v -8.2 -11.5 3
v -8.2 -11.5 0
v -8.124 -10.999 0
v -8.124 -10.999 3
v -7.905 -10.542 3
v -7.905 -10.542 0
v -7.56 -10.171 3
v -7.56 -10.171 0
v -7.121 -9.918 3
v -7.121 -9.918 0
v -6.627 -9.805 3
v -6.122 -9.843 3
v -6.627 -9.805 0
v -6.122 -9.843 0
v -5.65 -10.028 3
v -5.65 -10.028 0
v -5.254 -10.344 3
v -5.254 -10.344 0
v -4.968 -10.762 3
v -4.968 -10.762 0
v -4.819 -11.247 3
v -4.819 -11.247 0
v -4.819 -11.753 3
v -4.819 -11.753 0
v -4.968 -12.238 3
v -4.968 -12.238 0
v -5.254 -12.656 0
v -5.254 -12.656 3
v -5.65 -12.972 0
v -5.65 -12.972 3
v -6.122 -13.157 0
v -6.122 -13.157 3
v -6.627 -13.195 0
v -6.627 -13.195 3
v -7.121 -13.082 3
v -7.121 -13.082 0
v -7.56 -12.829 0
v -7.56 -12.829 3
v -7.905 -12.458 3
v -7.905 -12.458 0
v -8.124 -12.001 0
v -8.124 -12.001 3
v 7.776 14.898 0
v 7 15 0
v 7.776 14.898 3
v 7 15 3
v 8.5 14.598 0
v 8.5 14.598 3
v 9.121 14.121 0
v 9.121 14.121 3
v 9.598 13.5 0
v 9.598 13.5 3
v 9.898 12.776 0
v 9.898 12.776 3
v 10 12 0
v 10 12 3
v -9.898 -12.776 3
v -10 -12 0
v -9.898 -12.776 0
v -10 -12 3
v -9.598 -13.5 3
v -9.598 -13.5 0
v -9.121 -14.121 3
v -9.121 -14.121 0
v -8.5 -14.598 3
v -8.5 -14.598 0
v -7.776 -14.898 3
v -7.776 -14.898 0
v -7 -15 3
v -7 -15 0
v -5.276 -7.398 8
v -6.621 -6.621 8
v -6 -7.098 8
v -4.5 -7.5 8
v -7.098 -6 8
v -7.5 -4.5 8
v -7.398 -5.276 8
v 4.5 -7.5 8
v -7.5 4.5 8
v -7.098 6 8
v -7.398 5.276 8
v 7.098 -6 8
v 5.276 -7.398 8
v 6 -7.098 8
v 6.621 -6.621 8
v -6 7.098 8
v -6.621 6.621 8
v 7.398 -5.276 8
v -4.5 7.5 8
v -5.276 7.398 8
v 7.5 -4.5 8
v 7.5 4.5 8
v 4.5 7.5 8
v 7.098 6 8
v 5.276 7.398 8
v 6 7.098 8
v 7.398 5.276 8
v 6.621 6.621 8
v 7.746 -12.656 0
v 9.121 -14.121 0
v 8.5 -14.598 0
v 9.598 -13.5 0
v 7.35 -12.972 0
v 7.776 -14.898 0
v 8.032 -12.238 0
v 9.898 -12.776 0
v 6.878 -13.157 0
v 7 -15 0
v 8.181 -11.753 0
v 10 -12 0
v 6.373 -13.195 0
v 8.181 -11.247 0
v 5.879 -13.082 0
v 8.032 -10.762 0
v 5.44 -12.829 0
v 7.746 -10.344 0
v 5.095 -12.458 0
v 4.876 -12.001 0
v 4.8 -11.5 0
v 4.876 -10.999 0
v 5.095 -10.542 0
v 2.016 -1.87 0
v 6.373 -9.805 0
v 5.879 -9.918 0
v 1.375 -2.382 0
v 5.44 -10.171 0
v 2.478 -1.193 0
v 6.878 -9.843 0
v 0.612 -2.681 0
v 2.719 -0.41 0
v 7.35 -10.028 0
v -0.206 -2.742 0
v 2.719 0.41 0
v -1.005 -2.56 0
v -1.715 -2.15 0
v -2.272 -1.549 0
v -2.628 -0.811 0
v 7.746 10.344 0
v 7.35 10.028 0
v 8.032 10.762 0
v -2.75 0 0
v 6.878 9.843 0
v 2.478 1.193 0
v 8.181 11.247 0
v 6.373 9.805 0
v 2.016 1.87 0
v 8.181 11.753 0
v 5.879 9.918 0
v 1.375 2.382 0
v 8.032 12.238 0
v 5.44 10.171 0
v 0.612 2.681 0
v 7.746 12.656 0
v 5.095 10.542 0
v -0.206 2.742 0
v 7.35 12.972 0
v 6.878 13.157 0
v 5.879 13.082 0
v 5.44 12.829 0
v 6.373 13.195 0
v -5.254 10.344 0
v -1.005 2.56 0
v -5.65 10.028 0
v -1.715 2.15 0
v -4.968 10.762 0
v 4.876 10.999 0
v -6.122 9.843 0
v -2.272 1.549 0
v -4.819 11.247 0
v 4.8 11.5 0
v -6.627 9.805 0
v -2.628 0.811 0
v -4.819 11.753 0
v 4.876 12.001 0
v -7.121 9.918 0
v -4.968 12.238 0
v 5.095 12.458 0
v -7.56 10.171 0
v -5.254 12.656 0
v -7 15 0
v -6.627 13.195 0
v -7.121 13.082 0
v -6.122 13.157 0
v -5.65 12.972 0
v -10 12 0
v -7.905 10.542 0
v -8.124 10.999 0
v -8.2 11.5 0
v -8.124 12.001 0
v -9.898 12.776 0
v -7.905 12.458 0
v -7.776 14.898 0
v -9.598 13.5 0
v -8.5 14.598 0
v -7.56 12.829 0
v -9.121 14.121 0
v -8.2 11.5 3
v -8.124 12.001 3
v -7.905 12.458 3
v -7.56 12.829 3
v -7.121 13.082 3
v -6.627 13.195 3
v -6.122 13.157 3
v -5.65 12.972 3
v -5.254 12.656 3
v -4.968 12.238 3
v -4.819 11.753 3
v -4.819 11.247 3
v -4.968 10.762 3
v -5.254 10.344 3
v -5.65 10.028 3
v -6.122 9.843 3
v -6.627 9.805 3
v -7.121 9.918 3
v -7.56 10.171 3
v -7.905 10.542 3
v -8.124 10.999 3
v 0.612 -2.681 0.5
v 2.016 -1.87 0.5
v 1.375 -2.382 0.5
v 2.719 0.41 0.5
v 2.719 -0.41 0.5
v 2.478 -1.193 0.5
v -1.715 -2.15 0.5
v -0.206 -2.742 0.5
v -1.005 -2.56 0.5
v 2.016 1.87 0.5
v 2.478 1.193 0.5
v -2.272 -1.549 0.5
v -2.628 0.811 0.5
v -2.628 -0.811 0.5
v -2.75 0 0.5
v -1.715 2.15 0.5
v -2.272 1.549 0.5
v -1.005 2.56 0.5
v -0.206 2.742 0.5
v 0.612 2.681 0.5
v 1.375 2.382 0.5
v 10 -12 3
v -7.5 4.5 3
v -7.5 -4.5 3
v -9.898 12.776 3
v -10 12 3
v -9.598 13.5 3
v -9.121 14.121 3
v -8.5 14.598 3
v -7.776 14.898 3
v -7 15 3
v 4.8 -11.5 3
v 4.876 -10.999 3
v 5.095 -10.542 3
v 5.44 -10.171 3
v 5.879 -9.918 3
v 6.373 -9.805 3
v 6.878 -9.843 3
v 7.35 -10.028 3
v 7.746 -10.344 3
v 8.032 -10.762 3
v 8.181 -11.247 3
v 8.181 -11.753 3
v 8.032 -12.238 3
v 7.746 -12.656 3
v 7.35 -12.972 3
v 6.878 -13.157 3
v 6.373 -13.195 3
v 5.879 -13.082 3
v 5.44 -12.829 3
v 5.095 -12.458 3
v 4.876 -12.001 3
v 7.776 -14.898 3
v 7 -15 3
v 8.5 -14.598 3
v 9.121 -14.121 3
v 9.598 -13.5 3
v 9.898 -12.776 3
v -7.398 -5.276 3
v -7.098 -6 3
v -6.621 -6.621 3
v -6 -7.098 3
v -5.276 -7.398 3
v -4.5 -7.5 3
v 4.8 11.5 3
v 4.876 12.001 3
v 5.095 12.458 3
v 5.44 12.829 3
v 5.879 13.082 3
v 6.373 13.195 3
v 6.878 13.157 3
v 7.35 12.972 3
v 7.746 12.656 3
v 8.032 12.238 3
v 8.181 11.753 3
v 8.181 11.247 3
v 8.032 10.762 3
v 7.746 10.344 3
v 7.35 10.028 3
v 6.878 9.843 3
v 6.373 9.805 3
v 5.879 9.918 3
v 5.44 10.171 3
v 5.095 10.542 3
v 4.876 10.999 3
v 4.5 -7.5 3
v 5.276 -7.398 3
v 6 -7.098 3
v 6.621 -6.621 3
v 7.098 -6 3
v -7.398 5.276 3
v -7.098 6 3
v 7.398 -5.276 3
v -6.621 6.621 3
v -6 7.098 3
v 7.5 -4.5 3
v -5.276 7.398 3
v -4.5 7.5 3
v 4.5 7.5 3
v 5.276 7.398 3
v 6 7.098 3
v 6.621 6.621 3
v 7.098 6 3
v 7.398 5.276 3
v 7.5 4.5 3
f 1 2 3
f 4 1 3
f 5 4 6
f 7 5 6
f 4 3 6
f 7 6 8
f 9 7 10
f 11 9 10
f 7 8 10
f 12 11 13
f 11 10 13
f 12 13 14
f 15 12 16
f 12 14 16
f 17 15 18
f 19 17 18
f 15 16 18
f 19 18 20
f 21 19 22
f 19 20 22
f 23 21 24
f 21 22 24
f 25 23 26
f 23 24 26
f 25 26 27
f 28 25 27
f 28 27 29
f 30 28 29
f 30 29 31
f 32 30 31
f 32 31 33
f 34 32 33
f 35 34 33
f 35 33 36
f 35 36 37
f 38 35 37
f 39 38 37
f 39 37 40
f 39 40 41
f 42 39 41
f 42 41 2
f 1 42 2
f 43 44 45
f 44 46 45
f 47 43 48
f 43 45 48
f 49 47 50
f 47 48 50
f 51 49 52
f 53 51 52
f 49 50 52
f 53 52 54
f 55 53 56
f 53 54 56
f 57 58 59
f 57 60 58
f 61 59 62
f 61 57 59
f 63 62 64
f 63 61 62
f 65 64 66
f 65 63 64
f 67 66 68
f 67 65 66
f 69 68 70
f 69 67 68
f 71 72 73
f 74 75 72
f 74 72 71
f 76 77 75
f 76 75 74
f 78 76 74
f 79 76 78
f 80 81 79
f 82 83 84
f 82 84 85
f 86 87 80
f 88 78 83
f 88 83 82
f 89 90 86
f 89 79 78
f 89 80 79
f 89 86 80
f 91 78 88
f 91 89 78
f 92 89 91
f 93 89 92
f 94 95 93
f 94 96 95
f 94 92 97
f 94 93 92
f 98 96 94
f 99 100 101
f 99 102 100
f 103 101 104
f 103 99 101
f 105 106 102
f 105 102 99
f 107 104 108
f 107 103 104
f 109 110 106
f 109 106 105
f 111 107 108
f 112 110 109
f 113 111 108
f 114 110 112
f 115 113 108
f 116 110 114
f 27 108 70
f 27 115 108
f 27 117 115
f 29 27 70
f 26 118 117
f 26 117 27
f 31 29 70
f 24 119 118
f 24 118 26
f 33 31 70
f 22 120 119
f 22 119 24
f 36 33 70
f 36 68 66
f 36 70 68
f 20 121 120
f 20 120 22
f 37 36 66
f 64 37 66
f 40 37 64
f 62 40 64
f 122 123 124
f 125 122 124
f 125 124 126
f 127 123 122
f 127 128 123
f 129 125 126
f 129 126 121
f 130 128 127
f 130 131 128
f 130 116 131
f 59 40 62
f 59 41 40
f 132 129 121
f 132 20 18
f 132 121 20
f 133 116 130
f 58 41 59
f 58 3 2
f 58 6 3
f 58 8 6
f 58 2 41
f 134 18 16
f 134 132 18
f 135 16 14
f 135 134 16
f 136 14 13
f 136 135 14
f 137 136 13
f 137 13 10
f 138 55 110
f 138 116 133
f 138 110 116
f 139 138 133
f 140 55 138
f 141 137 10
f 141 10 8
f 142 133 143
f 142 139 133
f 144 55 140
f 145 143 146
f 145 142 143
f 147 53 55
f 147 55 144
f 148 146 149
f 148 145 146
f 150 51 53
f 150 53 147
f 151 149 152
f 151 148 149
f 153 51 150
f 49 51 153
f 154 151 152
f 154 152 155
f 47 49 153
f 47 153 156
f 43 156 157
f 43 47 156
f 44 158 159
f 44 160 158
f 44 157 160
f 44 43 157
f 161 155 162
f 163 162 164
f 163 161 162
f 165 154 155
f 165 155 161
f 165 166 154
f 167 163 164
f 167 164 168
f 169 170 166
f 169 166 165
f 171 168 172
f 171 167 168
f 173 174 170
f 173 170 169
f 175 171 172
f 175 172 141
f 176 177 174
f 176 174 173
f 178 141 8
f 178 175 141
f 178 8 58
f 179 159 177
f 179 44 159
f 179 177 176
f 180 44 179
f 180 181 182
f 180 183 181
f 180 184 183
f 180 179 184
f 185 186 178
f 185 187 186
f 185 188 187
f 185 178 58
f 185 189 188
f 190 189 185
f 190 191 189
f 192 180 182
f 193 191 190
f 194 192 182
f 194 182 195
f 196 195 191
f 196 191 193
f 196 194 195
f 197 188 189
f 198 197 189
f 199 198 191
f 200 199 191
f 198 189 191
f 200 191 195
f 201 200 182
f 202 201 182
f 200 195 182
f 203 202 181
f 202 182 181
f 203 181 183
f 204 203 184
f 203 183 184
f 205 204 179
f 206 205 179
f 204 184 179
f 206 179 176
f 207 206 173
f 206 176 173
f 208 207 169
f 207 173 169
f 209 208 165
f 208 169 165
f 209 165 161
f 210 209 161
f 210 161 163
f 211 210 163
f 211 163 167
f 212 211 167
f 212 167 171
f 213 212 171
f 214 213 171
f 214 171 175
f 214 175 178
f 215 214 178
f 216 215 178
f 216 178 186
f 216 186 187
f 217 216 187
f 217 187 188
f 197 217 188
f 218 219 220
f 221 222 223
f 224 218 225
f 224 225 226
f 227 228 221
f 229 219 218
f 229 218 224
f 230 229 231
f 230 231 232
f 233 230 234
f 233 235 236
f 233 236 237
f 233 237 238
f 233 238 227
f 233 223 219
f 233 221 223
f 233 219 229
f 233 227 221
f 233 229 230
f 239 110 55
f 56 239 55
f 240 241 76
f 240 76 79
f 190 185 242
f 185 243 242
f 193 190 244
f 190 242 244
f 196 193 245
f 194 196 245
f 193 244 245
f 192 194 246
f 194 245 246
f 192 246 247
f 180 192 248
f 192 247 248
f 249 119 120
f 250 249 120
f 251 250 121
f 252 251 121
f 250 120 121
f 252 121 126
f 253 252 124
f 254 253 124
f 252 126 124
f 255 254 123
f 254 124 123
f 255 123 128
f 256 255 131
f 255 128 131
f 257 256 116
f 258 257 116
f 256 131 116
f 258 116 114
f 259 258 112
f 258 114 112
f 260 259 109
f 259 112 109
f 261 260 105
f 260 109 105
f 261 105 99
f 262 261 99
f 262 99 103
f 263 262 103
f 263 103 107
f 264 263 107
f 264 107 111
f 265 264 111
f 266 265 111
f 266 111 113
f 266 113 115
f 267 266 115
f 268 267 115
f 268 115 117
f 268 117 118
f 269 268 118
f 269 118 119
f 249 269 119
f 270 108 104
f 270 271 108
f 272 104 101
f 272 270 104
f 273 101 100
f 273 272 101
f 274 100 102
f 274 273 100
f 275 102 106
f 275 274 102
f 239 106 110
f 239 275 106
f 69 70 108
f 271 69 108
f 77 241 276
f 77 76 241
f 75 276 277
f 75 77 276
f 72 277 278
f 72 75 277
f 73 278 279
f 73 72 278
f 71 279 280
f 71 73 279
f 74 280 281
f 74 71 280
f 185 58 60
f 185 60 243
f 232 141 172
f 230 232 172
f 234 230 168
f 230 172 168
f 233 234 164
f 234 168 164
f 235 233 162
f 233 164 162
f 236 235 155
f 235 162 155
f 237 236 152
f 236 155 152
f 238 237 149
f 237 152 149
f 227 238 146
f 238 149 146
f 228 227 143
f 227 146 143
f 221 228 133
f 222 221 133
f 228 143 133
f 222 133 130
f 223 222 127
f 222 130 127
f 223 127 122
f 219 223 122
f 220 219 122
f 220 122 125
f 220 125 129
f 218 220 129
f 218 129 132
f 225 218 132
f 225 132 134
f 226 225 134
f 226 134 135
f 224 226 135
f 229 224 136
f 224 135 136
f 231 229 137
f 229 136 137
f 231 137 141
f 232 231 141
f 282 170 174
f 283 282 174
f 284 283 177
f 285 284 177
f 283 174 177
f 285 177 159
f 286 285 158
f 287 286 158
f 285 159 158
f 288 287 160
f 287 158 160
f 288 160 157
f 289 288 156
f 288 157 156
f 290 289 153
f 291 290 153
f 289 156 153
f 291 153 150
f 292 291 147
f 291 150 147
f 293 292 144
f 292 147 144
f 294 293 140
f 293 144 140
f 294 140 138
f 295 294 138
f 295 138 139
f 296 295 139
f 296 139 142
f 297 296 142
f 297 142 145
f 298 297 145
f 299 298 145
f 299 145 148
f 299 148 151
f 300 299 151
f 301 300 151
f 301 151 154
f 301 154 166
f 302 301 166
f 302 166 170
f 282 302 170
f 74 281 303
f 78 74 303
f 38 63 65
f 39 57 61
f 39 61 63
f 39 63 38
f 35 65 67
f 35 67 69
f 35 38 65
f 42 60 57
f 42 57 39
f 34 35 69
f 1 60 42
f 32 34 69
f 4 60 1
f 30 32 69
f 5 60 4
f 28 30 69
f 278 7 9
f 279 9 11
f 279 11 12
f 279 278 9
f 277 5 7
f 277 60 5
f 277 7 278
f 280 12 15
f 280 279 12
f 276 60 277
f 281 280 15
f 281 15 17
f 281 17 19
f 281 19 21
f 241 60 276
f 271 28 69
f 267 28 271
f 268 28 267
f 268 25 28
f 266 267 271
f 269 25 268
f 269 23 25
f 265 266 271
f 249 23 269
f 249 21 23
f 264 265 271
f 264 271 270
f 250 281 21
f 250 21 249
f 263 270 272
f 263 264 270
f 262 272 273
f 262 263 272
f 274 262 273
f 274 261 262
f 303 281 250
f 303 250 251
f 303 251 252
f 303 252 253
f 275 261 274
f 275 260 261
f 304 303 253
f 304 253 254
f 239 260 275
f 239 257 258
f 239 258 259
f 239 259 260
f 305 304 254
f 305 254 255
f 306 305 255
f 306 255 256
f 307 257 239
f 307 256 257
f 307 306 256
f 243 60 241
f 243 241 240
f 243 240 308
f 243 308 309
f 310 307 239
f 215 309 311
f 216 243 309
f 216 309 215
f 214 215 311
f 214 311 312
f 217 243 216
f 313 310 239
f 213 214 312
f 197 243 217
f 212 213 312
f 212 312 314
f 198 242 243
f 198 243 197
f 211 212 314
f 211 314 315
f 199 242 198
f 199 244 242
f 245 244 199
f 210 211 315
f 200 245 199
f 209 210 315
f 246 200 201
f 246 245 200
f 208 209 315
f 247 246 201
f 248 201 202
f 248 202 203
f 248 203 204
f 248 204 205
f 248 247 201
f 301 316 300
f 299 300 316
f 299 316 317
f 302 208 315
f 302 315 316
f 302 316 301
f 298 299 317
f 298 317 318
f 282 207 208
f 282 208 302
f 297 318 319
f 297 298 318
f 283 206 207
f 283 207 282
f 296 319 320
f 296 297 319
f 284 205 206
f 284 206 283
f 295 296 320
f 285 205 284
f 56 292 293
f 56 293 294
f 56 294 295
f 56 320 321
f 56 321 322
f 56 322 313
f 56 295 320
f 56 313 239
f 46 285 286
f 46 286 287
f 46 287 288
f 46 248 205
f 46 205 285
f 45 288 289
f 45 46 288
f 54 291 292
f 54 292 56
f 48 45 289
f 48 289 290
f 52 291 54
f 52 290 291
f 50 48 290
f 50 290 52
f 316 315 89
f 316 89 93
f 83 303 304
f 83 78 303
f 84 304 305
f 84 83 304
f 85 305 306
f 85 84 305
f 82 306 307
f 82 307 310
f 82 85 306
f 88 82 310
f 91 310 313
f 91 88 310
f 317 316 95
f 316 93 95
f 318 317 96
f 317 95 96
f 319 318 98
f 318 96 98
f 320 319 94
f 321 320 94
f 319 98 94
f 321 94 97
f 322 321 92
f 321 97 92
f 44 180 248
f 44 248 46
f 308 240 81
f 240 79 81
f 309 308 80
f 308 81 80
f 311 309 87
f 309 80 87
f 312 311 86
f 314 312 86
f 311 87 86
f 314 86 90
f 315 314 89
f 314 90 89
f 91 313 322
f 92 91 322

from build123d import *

# Parameters (mm, degrees)
SKETCH1_W                  = 20
SKETCH1_H                  = 30
BOSS_EXTRUDE1_DEPTH        = 3
F_3_4_3_4_DIAMETER_HOLE1_D = 3.4
SKETCH5_R                  = 3.4
CUT_EXTRUDE1_DEPTH         = 0.5
FILLET1_R                  = 3
SKETCH7_W                  = 8
SKETCH7_H                  = 15
BOSS_EXTRUDE3_DEPTH        = 11
CUT_EXTRUDE3_DEPTH         = 25.839484697
CUT_EXTRUDE3_DEPTH_BACK    = 25.839484697
SKETCH11_OUTSIDE_W         = 29.736
SKETCH11_OUTSIDE_H         = 39.736
SKETCH11_OUTSIDE_R         = 2.5
CUT_EXTRUDE4_DEPTH         = 22.118712082
SKETCH12_W                 = 7.43023475
SKETCH12_H                 = 21.108621448
CUT_EXTRUDE5_DEPTH         = 29.653097564
SKETCH13_R                 = 3.4
SKETCH13_R_2               = 2.75
BOSS_EXTRUDE4_DEPTH        = 0.5
SKETCH14_W                 = 15
SKETCH14_H                 = 15
BOSS_EXTRUDE5_DEPTH        = 5
FILLET2_R                  = 3


with BuildPart() as part:
    # Sketch1 → Boss-Extrude1 (new body)
    with BuildSketch(Plane.XY):
        Rectangle(SKETCH1_W, SKETCH1_H)
    extrude(amount=BOSS_EXTRUDE1_DEPTH)

    # Ø3.4 (3.4) Diameter Hole1 (through all)
    with Locations(Plane.XY.offset(3)):
        with Locations((-6.5, 11.5), (6.5, 11.5), (6.5, -11.5), (-6.5, -11.5)):
            Hole(F_3_4_3_4_DIAMETER_HOLE1_D / 2)

    # Sketch5 → Cut-Extrude1 (cut)
    with BuildSketch(Plane(origin=(0, 0, 0), x_dir=(-1, 0, 0), z_dir=(0, 0, -1))):
        Circle(SKETCH5_R)
    extrude(amount=-CUT_EXTRUDE1_DEPTH, mode=Mode.SUBTRACT)

    # Fillet1
    fillet1_edges = [part.edges().sort_by_distance(p)[0] for p in [
        (10, -15, 1.5),
        (-10, -15, 1.5),
        (-10, 15, 1.5),
        (10, 15, 1.5),
    ]]
    fillet(fillet1_edges, radius=FILLET1_R)

    # Sketch7 → Boss-Extrude3 (add)
    with BuildSketch(Plane.XY.offset(3)):
        Rectangle(SKETCH7_W, SKETCH7_H)
    extrude(amount=BOSS_EXTRUDE3_DEPTH)

    # Sketch8 → Cut-Extrude3 (cut, two sides: drawn at the far end of the back side and taken through both)
    with BuildSketch(Plane(origin=(4, 0, 0), x_dir=(0, 0, -1), z_dir=(1, 0, 0)).offset(-CUT_EXTRUDE3_DEPTH_BACK)):
        Polygon((-14, -6), (-14, -7), (-13.133974596, -6.5), align=None)
        Polygon((-13.133974596, -7.5), (-14, -7), (-14, -7.5), align=None)
        Polygon((-14, -5), (-14, -6), (-13.133974596, -5.5), align=None)
        Polygon((-14, -4), (-14, -5), (-13.133974596, -4.5), align=None)
        Polygon((-14, -3), (-14, -4), (-13.133974596, -3.5), align=None)
        Polygon((-14, 7), (-13.133974596, 7.5), (-14, 7.5), align=None)
        Polygon((-14, -2), (-14, -3), (-13.133974596, -2.5), align=None)
        Polygon((-13.133974596, 6.5), (-14, 7), (-14, 6), align=None)
        Polygon((-14, -1), (-14, -2), (-13.133974596, -1.5), align=None)
        Polygon((-13.133974596, 5.5), (-14, 6), (-14, 5), align=None)
        Polygon((-14, 0), (-14, -1), (-13.133974596, -0.5), align=None)
        Polygon((-13.133974596, 4.5), (-14, 5), (-14, 4), align=None)
        Polygon((-14, 1), (-14, 0), (-13.133974596, 0.5), align=None)
        Polygon((-13.133974596, 3.5), (-14, 4), (-14, 3), align=None)
        Polygon((-14, 2), (-14, 1), (-13.133974596, 1.5), align=None)
        Polygon((-13.133974596, 2.5), (-14, 3), (-14, 2), align=None)
    extrude(amount=CUT_EXTRUDE3_DEPTH + CUT_EXTRUDE3_DEPTH_BACK, mode=Mode.SUBTRACT)

    # Sketch11 outside → Cut-Extrude4 (cut, through all)
    with BuildSketch(Plane.XY.offset(3)):
        Rectangle(SKETCH11_OUTSIDE_W, SKETCH11_OUTSIDE_H)
        Circle(SKETCH11_OUTSIDE_R, mode=Mode.SUBTRACT)
    extrude(amount=CUT_EXTRUDE4_DEPTH, mode=Mode.SUBTRACT)

    # Sketch12 → Cut-Extrude5 (cut, through all)
    with BuildSketch(Plane(origin=(10, 0, 0), x_dir=(0, 0, -1), z_dir=(1, 0, 0))):
        with Locations((-11.715117375, -0.112579314)):
            Rectangle(SKETCH12_W, SKETCH12_H)
    extrude(amount=-CUT_EXTRUDE5_DEPTH, mode=Mode.SUBTRACT)

    # Sketch13 → Boss-Extrude4 (add)
    with BuildSketch(Plane(origin=(0, 0, 0), x_dir=(-1, 0, 0), z_dir=(0, 0, -1))):
        Circle(SKETCH13_R)
        Circle(SKETCH13_R_2, mode=Mode.SUBTRACT)
    extrude(amount=-BOSS_EXTRUDE4_DEPTH)

    # Sketch14 → Boss-Extrude5 (add)
    with BuildSketch(Plane.XY.offset(3)):
        Rectangle(SKETCH14_W, SKETCH14_H)
    extrude(amount=BOSS_EXTRUDE5_DEPTH)

    # Fillet2
    fillet2_edges = [part.edges().sort_by_distance(p)[0] for p in [
        (7.5, 7.5, 5.5),
        (7.5, -7.5, 5.5),
        (-7.5, -7.5, 5.5),
        (-7.5, 7.5, 5.5),
    ]]
    fillet(fillet2_edges, radius=FILLET2_R)


solid = part.part
